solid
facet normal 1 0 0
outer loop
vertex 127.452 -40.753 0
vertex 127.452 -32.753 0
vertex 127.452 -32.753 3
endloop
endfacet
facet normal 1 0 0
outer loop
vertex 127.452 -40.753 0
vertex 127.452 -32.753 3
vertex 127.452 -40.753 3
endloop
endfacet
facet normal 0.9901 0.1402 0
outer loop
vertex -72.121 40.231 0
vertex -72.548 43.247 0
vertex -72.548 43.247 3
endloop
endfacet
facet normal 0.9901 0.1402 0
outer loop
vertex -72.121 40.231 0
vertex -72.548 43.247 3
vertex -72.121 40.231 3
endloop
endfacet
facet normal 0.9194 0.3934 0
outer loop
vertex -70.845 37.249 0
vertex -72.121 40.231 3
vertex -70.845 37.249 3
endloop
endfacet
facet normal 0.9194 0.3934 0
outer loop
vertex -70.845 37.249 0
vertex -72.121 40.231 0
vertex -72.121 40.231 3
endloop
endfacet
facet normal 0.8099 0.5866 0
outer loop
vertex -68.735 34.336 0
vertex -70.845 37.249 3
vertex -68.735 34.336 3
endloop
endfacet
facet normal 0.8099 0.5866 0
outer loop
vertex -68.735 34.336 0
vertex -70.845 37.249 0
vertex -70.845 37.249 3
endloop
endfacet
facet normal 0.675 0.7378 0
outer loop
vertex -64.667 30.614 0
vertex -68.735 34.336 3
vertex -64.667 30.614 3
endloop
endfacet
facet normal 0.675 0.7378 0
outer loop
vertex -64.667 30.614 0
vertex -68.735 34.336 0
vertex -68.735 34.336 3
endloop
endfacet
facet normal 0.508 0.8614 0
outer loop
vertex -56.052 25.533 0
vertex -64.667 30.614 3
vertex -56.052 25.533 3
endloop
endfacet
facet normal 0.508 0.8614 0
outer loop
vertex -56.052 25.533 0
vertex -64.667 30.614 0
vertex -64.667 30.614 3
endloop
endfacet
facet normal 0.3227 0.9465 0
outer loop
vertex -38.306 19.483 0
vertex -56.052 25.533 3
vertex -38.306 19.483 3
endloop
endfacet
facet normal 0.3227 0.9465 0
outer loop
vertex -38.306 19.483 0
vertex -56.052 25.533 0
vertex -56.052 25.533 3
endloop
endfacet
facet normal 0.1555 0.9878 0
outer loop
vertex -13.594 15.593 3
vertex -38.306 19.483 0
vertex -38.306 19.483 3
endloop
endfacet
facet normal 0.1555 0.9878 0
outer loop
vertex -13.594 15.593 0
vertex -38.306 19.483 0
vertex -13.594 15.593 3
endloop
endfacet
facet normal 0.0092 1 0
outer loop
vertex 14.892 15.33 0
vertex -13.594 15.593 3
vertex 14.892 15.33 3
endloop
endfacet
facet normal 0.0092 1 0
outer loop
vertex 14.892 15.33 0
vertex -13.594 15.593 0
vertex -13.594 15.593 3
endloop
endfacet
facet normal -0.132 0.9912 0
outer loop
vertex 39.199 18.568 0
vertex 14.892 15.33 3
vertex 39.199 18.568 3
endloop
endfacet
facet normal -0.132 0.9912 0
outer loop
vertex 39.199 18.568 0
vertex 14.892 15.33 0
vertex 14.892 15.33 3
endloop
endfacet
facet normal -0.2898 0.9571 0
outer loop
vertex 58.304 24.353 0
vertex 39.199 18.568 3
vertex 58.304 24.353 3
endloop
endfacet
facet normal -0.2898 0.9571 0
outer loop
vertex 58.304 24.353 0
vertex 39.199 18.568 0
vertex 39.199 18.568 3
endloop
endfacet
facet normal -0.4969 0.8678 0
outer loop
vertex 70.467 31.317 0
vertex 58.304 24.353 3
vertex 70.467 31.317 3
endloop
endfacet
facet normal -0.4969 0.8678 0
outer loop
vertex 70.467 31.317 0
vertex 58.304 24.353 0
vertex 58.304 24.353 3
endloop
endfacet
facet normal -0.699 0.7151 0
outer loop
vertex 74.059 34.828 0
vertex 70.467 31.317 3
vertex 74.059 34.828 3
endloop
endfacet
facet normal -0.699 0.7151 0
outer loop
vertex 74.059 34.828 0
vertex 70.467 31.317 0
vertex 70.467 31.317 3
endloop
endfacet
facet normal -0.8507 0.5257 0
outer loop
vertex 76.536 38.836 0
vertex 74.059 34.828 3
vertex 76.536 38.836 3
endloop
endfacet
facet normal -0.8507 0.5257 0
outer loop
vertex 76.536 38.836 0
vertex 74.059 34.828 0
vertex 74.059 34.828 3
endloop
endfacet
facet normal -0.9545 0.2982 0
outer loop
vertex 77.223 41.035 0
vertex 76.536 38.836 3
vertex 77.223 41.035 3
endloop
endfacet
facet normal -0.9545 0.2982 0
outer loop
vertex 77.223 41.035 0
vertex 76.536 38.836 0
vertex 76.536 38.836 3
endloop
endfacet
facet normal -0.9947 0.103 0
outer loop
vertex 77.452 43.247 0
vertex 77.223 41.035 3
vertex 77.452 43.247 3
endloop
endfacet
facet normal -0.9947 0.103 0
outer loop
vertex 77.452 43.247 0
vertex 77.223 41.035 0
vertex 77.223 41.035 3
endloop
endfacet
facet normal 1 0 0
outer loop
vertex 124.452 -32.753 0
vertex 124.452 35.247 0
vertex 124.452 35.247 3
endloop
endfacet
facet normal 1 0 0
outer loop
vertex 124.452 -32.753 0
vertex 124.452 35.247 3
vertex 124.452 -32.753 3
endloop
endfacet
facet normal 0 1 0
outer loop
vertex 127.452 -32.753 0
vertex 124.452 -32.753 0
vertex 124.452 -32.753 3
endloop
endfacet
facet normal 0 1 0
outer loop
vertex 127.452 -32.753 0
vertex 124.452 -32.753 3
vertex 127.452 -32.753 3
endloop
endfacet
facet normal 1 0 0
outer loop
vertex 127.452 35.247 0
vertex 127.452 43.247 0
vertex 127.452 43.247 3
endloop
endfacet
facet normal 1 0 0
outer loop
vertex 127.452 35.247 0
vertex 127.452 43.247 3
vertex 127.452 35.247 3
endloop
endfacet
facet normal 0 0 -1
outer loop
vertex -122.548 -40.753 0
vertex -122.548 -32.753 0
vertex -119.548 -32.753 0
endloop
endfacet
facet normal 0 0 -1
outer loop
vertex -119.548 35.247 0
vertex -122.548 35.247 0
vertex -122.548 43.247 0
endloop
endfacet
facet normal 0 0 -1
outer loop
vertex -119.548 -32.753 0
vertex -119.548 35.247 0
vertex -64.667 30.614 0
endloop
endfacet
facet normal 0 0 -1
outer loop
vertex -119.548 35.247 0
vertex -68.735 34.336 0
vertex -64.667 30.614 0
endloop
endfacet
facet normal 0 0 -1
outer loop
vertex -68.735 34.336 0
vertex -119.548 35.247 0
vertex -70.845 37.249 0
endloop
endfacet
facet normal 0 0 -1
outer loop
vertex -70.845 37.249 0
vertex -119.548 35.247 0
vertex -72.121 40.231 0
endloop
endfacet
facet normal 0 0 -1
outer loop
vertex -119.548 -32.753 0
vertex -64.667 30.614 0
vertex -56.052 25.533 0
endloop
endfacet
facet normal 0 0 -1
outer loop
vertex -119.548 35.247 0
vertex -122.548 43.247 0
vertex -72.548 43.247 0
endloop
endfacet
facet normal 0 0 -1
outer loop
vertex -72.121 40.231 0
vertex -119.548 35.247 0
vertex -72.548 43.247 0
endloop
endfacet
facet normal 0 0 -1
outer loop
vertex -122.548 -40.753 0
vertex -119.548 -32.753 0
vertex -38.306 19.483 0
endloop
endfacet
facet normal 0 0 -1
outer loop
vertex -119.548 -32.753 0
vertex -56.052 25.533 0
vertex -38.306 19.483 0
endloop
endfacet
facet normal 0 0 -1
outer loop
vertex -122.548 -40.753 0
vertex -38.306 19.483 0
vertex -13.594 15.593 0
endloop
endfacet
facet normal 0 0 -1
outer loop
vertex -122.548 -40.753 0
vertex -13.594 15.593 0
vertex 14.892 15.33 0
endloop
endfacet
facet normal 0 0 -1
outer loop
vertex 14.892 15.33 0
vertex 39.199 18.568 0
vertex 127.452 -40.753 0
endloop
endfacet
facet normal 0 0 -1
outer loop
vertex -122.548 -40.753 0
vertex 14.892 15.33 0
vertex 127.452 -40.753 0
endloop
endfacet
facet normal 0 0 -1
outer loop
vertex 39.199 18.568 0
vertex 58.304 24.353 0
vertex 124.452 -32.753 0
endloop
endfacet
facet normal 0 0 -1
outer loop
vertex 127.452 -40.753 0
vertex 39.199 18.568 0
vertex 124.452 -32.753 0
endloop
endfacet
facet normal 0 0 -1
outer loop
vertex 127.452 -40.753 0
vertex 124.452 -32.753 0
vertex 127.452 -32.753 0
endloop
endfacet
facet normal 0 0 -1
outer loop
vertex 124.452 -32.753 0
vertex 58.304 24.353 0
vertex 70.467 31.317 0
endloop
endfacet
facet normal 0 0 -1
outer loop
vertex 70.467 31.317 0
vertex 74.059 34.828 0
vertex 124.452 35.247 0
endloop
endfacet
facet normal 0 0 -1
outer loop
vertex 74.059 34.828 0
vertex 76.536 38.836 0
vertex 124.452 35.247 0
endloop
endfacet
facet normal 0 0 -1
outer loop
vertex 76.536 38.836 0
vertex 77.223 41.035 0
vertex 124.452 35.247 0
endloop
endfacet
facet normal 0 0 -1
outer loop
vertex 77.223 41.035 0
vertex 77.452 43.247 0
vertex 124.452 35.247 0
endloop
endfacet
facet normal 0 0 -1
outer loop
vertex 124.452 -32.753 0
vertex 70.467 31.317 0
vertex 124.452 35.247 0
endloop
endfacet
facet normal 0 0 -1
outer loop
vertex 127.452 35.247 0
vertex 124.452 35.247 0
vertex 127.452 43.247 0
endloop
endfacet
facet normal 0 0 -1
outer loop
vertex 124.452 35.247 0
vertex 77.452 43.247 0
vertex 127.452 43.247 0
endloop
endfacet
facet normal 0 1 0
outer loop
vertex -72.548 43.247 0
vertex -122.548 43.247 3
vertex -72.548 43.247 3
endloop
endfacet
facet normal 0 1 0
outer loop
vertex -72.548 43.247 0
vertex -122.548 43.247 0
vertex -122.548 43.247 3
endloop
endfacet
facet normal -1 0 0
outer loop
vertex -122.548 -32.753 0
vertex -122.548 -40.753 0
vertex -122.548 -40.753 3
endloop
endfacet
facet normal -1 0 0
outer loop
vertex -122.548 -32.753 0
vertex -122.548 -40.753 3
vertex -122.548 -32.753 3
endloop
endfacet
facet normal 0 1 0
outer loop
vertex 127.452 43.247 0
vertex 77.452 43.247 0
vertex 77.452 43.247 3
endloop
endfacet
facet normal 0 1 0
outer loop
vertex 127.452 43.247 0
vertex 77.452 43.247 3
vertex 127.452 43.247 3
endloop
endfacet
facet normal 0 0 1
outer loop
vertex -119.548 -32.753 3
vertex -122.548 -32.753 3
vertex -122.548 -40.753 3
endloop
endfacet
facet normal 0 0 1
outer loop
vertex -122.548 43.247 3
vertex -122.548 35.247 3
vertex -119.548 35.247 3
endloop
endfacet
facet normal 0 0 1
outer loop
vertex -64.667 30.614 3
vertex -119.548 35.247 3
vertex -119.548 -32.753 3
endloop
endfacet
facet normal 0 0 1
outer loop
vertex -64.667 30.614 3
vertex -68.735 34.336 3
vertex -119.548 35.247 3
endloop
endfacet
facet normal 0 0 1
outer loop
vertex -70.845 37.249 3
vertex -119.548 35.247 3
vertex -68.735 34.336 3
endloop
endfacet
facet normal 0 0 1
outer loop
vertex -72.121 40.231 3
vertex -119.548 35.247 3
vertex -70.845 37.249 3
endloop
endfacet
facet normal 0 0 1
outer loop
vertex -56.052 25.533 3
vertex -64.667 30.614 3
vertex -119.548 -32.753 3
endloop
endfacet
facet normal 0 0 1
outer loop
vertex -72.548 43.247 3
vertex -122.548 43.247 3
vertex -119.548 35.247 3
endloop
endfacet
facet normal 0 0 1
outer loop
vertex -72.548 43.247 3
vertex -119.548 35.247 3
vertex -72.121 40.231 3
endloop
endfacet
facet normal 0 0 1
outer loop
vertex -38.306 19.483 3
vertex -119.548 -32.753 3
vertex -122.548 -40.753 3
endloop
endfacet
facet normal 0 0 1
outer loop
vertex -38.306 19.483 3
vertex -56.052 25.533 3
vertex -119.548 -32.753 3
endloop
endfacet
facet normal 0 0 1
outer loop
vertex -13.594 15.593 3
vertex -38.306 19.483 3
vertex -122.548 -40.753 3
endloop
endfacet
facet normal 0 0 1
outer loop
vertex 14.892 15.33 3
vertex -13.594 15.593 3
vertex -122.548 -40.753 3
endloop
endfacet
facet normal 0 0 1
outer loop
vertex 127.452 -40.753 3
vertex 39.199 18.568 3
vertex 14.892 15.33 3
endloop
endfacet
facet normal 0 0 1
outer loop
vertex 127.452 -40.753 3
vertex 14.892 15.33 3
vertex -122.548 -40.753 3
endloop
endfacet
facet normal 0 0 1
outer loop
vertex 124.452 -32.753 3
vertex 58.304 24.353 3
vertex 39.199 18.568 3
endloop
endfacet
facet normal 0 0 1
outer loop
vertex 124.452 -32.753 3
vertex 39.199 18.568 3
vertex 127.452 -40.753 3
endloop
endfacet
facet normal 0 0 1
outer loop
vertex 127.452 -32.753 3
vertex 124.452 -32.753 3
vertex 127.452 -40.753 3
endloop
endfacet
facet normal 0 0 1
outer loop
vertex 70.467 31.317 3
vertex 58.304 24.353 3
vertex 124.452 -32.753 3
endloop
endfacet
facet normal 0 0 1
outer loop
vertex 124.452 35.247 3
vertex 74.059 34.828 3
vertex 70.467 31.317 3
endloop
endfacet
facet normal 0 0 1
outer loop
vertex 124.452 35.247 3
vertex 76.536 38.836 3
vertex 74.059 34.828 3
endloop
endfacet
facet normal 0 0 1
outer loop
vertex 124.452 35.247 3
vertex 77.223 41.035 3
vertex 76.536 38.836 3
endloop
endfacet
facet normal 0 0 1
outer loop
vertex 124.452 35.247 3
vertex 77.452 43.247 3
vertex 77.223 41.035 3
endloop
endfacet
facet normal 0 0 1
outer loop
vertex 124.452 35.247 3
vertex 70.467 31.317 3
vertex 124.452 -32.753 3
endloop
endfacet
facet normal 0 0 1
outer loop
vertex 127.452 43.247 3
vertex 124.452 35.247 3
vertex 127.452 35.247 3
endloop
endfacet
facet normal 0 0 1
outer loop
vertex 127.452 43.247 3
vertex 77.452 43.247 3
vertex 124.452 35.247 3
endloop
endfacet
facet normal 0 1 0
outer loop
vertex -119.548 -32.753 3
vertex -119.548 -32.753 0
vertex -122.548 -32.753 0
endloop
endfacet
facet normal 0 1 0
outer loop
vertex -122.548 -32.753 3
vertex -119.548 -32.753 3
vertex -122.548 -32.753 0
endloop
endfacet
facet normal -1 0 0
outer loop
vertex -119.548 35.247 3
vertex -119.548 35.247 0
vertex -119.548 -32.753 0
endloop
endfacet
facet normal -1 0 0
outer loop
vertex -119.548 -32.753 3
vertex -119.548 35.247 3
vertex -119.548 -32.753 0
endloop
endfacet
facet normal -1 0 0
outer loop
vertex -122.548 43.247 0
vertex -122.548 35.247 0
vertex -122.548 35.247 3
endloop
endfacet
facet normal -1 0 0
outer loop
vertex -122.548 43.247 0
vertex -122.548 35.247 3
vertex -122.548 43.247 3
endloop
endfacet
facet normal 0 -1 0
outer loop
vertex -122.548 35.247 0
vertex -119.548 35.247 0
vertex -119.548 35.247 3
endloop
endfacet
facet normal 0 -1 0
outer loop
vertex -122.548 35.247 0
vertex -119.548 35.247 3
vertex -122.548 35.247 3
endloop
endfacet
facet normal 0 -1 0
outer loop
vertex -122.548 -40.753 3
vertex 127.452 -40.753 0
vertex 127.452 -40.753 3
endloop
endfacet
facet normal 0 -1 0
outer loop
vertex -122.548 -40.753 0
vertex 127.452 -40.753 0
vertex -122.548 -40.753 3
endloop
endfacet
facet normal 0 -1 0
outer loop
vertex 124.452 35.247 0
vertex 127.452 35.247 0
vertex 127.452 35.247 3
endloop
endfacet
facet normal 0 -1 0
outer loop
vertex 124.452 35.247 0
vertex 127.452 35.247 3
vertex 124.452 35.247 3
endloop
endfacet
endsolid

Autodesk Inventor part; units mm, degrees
ref_plane "YZ Plane" through (0, 0, 0) normal (1, 0, 0) x (0, 1, 0)
ref_plane "XZ Plane" through (0, 0, 0) normal (0, 1, 0) x (-1, 0, 0)
ref_plane "XY Plane" through (0, 0, 0) normal (0, 0, 1) x (1, 0, 0)
sketch "Эскиз1" plane through (0, 0, 0) normal (0, 0, 1) x (1, 0, 0)
  line L0 (127.4522, 43.2469) -> (127.4522, -40.7531)
  line L1 (127.4522, -40.7531) -> (-122.5478, -40.7531)
  line L2 (-122.5478, -40.7531) -> (-122.5478, 43.2469)
  line L3 (-119.5478, -40.7531) -> (-122.5478, -40.7531)
  line L4 (-119.5478, 35.2469) -> (-122.5478, 35.2469)
  line L5 (-119.5478, -40.7531) -> (-119.5478, -32.7531)
  line L6 (-122.5478, 35.2469) -> (-119.5478, 35.2469)
  line L7 (-119.5478, 35.2469) -> (-119.5478, -32.7531)
  line L8 (-119.5478, -32.7531) -> (-122.5478, -32.7531)
  line L9 (-122.5478, -32.7531) -> (-122.5478, 35.2469)
  ellipse E0 centre (2.4522, 43.2469) end of major axis (77.4522, 43.2469) minor radius 28.3094 (-72.5478, 43.2469) -> (77.4522, 43.2469) ccw
  line L10 (-122.5478, 43.2469) -> (-72.5478, 43.2469)
  line L11 (77.4522, 43.2469) -> (127.4522, 43.2469)
  line L12 (127.4522, 35.2469) -> (124.4522, 35.2469)
  line L13 (124.4522, 35.2469) -> (124.4522, -32.7531)
  line L14 (124.4522, -32.7531) -> (127.4522, -32.7531)
  line L15 (127.4522, -32.7531) -> (127.4522, 35.2469)
  point P0 (0, 0)
  point P1 (125.9522, -32.7531)
  dimension "d1" = 75
  dimension "d0" = 250
  dimension "d2" = 125
  dimension "d3" = 84
  dimension "d4" = 150
  dimension "d5" = 84
  dimension "d6" = 3
  dimension "d7" = 8
extrude "Выдавливание1" add sketch "Эскиз1" along normal blind 3 contours L0 L12 L13 L14 L1 L5 L7 L4 L2 L10 E0 L11 | L1 L2 L8 L5
properties part number "боковая стенка"
